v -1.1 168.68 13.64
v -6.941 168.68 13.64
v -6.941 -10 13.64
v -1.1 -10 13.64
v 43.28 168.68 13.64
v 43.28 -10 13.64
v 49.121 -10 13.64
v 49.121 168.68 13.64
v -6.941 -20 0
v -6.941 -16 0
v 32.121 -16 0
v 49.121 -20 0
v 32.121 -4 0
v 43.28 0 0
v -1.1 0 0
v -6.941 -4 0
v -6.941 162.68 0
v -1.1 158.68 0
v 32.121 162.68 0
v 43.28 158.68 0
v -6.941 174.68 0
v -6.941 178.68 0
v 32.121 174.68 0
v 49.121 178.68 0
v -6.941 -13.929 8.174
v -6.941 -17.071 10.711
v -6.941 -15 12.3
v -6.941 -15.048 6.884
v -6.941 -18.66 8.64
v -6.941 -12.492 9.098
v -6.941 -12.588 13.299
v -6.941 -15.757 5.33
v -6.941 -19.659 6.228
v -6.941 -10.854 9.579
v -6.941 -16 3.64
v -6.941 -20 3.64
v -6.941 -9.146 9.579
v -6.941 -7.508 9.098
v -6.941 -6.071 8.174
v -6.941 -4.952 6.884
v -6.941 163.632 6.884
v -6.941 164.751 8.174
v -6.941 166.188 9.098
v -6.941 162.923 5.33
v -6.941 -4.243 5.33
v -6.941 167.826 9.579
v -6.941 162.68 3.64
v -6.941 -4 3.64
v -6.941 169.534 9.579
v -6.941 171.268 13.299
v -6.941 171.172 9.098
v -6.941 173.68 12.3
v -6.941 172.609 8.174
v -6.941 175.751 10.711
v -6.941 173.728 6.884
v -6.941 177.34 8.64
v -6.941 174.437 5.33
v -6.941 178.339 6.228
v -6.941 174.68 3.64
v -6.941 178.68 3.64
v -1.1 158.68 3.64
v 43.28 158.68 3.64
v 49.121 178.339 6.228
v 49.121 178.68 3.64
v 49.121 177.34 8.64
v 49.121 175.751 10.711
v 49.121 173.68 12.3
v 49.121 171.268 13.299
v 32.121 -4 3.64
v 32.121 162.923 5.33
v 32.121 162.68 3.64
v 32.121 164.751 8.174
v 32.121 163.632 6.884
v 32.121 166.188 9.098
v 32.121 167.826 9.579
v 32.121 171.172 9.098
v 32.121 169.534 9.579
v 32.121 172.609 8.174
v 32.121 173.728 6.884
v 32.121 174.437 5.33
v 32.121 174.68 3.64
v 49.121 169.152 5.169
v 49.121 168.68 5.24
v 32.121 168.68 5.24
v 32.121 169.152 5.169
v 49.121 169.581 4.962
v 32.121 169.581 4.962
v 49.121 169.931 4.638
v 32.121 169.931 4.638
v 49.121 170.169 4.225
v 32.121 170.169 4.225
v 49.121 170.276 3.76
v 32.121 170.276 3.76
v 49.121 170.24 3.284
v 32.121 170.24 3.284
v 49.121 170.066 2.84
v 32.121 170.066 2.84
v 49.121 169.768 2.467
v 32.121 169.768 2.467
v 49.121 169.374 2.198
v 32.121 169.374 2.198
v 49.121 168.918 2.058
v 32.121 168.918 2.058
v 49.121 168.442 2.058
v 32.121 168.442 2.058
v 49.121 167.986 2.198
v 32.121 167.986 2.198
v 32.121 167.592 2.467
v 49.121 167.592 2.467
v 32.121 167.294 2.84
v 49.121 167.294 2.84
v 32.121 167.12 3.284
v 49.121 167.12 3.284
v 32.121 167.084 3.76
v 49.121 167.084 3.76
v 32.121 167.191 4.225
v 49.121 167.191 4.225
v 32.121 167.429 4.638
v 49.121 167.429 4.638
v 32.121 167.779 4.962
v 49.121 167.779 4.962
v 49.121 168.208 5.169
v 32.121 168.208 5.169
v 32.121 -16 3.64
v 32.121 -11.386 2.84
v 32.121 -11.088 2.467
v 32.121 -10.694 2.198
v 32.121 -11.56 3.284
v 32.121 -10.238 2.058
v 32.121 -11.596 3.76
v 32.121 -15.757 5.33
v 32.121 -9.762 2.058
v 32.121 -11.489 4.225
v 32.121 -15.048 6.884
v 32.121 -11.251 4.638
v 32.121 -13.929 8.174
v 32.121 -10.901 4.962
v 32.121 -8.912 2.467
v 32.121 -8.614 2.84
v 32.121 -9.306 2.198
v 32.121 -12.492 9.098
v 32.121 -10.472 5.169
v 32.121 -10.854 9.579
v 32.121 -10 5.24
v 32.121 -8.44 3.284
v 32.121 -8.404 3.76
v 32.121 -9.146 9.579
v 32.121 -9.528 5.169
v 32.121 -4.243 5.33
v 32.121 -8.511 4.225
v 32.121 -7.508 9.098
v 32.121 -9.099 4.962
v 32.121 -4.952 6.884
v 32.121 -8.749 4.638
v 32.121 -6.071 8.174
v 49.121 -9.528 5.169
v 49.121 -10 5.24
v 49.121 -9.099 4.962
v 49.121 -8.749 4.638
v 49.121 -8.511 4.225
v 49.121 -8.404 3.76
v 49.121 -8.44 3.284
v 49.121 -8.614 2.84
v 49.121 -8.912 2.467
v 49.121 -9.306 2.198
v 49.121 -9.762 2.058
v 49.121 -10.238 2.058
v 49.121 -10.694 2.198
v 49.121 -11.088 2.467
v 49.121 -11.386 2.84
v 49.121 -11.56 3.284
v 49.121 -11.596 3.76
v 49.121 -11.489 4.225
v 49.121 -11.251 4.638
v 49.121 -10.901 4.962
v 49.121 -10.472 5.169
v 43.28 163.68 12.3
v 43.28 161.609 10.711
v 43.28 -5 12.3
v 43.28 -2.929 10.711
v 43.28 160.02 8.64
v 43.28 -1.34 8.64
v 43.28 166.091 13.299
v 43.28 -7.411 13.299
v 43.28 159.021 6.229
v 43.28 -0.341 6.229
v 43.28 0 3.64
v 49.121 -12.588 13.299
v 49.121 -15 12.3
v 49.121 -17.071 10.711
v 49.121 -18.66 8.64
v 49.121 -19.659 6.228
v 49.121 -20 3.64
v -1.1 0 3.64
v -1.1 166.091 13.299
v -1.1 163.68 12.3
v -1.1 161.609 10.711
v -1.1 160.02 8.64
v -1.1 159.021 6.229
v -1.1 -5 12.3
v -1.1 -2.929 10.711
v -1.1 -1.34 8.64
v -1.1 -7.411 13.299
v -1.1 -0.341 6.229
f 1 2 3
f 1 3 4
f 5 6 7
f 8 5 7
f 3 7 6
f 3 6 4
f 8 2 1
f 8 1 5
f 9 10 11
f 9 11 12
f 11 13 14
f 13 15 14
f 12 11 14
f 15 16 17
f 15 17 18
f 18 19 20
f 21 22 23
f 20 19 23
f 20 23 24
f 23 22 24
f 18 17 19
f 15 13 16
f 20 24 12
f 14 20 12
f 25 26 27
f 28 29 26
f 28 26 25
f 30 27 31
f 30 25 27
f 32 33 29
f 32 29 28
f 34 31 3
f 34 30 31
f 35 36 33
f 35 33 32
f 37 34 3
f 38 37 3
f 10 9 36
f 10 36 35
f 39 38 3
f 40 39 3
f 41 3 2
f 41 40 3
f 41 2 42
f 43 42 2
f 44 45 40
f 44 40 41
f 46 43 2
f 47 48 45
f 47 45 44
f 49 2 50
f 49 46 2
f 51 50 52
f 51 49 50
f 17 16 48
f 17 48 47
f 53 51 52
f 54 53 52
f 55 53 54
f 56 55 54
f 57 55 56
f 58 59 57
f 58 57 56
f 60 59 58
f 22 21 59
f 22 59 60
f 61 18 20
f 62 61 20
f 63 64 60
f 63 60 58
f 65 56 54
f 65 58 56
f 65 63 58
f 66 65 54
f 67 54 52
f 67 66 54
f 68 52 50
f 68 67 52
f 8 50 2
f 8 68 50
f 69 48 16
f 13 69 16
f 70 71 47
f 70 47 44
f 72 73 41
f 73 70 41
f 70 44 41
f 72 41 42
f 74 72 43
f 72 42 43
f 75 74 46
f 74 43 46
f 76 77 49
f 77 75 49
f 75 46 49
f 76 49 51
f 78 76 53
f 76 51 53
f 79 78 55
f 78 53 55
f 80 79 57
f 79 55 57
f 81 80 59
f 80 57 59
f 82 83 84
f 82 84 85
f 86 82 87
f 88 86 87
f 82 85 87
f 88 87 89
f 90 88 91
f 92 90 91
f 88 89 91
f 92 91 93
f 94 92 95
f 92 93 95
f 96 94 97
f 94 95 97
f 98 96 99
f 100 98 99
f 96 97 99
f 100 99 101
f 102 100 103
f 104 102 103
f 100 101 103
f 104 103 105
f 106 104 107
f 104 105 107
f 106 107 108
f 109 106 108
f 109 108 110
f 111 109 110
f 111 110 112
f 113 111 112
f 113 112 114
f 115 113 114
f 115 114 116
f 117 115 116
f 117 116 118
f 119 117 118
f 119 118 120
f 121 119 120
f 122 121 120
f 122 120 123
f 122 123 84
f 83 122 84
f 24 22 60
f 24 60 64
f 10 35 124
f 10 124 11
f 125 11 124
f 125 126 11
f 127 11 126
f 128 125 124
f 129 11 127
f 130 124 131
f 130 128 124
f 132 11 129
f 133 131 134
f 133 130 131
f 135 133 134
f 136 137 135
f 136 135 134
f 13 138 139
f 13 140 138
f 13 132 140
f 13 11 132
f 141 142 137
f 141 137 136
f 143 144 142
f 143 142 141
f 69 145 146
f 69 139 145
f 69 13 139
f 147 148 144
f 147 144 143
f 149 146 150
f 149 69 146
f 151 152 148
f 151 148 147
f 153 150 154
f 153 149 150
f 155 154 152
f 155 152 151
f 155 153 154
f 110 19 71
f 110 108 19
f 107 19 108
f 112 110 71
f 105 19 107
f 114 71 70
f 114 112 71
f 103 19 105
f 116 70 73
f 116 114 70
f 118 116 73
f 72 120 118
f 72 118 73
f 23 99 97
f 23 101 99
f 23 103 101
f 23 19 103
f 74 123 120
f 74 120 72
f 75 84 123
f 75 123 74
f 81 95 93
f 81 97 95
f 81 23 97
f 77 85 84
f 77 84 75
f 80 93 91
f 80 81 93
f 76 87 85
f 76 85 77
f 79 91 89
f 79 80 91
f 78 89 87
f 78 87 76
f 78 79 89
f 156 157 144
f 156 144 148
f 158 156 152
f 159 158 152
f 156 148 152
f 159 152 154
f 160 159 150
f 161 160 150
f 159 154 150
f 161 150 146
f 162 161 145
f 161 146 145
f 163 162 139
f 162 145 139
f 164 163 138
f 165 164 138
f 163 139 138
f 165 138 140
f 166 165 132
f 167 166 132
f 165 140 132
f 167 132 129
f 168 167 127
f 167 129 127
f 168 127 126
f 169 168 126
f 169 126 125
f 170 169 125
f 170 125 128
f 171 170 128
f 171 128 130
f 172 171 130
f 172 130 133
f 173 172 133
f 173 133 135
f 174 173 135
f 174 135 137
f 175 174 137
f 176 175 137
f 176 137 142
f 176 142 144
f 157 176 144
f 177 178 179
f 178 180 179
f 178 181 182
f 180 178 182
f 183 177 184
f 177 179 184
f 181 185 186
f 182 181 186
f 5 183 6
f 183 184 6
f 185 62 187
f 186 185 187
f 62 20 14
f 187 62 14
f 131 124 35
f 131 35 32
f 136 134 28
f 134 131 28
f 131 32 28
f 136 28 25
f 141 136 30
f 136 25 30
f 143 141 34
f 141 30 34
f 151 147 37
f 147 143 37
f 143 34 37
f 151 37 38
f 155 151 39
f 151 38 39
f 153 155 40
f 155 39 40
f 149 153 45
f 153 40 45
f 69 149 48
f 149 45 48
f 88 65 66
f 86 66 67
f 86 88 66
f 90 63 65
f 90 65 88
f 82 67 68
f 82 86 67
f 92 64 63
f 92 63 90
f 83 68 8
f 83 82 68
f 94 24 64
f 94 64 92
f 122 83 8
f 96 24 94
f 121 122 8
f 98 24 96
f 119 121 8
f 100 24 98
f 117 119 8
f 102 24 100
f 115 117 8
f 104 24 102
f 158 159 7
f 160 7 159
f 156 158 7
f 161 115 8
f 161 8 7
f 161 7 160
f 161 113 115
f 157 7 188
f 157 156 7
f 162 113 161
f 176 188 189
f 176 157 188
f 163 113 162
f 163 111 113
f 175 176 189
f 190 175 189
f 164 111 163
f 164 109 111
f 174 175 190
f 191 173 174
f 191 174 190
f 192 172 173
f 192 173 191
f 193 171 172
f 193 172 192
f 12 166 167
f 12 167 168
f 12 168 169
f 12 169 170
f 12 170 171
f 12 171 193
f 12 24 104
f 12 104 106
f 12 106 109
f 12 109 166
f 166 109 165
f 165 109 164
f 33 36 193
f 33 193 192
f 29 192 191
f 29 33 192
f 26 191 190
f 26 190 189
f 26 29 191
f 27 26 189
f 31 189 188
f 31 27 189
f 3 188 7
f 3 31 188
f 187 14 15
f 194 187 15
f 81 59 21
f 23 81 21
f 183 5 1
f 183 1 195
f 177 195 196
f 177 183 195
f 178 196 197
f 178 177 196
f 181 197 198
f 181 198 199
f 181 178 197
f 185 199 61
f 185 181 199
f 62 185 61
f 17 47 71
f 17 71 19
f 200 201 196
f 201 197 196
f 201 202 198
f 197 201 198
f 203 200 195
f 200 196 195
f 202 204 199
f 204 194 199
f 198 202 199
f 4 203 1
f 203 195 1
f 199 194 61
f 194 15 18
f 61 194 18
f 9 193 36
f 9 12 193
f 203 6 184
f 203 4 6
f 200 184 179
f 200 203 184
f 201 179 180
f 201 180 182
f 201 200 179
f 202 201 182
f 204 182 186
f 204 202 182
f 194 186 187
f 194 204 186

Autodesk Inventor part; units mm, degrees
ref_plane "YZ Plane" through (0, 0, 0) normal (1, 0, 0) x (0, 1, 0)
ref_plane "XZ Plane" through (0, 0, 0) normal (0, 1, 0) x (-1, 0, 0)
ref_plane "XY Plane" through (0, 0, 0) normal (0, 0, 1) x (1, 0, 0)
sketch "スケッチ1" plane through (0, 0, 0) normal (0, 0, 1) x (1, 0, 0)
  line L0 (-1.1, 1.1) -> (-1.1, 157.58) construction
  line L1 (42.18, 0) -> (0, 0) construction
  line L2 (43.28, 157.58) -> (43.28, 1.1) construction
  line L3 (0, 158.68) -> (42.18, 158.68) construction
  line L4 (43.28, 0) -> (-1.1, 0)
  line L5 (-1.1, 0) -> (-1.1, 158.68)
  line L6 (-1.1, 158.68) -> (43.28, 158.68)
  line L7 (43.28, 158.68) -> (43.28, 0)
  line L8 (49.121, 378.1158) -> (49.121, -108.9393) construction
  line L9 (49.121, -20) -> (-6.941, -20)
  line L10 (-6.941, -20) -> (-6.941, 178.68)
  line L11 (-6.941, 178.68) -> (49.121, 178.68)
  line L12 (49.121, 178.68) -> (49.121, -20)
  dimension "d0" = 20
  dimension "d1" = 20
  dimension "d2" = 5.841
  dimension "d15" = 5.841
extrude "押し出し1" add sketch "スケッチ1" along normal blind 13.64
sketch "スケッチ2" plane through (-6.941, -20, 0) normal (-1, 0, 0) x (0, 0, 1)
  circle A0 centre (3.64, 10) radius 1.6 projected
  circle A1 centre (3.64, 188.68) radius 1.6 projected
  point P0 (0, 20)
extrude "押し出し2" cut sketch "スケッチ2" against normal through all
fillet "フィレット1" radius 10 2 edges at (21.09, 178.68, 13.64) (21.09, -20, 13.64)
sketch "スケッチ3" plane through (-6.941, -20, 0) normal (-1, 0, 0) x (0, 0, 1)
  circle A0 centre (3.64, 188.68) radius 1.6 construction
  circle A1 centre (3.64, 10) radius 1.6 construction
  circle A2 centre (3.64, 188.68) radius 1.6 projected
  circle A3 centre (3.64, 188.68) radius 6
  circle A4 centre (3.64, 10) radius 6
  point P0 (0, 20)
  dimension "d8" = 12
extrude "押し出し3" cut sketch "スケッチ3" against normal blind 39.062
fillet "フィレット2" [suppressed]
fillet "フィレット3" radius 10 2 edges at (21.09, 0, 13.64) (21.09, 158.68, 13.64)
sketch "スケッチ4" plane through (-6.941, -10, 13.64) normal (-1, 0, 0) x (0, 0, 1)
  line L0 (-13.64, -4.7697) -> (-13.64, -10) projected
  line L1 (-13.64, 173.9103) -> (-13.64, 4.7697) projected
  arc A0 (-13.64, -4.7697) -> (-13.64, 4.7697) centre (-10, 0) ccw projected
  line L2 (-13.64, 188.68) -> (-13.64, 183.4497) projected
  arc A1 (-13.64, 173.9103) -> (-13.64, 183.4497) centre (-10, 178.68) ccw projected
  line L3 (-10, -6) -> (-13.64, -6)
  line L4 (-10, 6) -> (-13.64, 6)
  line L5 (-10, 172.68) -> (-13.64, 172.68)
  line L6 (-10, 184.68) -> (-13.64, 184.68)
  point P0 (-13.64, 10)
extrude "押し出し4" cut sketch "スケッチ4" against normal up to surface (39.062 mm away)
equation "\"d1\" = d0"
equation "\"d2\" = d15"
properties part number "io_fix"
